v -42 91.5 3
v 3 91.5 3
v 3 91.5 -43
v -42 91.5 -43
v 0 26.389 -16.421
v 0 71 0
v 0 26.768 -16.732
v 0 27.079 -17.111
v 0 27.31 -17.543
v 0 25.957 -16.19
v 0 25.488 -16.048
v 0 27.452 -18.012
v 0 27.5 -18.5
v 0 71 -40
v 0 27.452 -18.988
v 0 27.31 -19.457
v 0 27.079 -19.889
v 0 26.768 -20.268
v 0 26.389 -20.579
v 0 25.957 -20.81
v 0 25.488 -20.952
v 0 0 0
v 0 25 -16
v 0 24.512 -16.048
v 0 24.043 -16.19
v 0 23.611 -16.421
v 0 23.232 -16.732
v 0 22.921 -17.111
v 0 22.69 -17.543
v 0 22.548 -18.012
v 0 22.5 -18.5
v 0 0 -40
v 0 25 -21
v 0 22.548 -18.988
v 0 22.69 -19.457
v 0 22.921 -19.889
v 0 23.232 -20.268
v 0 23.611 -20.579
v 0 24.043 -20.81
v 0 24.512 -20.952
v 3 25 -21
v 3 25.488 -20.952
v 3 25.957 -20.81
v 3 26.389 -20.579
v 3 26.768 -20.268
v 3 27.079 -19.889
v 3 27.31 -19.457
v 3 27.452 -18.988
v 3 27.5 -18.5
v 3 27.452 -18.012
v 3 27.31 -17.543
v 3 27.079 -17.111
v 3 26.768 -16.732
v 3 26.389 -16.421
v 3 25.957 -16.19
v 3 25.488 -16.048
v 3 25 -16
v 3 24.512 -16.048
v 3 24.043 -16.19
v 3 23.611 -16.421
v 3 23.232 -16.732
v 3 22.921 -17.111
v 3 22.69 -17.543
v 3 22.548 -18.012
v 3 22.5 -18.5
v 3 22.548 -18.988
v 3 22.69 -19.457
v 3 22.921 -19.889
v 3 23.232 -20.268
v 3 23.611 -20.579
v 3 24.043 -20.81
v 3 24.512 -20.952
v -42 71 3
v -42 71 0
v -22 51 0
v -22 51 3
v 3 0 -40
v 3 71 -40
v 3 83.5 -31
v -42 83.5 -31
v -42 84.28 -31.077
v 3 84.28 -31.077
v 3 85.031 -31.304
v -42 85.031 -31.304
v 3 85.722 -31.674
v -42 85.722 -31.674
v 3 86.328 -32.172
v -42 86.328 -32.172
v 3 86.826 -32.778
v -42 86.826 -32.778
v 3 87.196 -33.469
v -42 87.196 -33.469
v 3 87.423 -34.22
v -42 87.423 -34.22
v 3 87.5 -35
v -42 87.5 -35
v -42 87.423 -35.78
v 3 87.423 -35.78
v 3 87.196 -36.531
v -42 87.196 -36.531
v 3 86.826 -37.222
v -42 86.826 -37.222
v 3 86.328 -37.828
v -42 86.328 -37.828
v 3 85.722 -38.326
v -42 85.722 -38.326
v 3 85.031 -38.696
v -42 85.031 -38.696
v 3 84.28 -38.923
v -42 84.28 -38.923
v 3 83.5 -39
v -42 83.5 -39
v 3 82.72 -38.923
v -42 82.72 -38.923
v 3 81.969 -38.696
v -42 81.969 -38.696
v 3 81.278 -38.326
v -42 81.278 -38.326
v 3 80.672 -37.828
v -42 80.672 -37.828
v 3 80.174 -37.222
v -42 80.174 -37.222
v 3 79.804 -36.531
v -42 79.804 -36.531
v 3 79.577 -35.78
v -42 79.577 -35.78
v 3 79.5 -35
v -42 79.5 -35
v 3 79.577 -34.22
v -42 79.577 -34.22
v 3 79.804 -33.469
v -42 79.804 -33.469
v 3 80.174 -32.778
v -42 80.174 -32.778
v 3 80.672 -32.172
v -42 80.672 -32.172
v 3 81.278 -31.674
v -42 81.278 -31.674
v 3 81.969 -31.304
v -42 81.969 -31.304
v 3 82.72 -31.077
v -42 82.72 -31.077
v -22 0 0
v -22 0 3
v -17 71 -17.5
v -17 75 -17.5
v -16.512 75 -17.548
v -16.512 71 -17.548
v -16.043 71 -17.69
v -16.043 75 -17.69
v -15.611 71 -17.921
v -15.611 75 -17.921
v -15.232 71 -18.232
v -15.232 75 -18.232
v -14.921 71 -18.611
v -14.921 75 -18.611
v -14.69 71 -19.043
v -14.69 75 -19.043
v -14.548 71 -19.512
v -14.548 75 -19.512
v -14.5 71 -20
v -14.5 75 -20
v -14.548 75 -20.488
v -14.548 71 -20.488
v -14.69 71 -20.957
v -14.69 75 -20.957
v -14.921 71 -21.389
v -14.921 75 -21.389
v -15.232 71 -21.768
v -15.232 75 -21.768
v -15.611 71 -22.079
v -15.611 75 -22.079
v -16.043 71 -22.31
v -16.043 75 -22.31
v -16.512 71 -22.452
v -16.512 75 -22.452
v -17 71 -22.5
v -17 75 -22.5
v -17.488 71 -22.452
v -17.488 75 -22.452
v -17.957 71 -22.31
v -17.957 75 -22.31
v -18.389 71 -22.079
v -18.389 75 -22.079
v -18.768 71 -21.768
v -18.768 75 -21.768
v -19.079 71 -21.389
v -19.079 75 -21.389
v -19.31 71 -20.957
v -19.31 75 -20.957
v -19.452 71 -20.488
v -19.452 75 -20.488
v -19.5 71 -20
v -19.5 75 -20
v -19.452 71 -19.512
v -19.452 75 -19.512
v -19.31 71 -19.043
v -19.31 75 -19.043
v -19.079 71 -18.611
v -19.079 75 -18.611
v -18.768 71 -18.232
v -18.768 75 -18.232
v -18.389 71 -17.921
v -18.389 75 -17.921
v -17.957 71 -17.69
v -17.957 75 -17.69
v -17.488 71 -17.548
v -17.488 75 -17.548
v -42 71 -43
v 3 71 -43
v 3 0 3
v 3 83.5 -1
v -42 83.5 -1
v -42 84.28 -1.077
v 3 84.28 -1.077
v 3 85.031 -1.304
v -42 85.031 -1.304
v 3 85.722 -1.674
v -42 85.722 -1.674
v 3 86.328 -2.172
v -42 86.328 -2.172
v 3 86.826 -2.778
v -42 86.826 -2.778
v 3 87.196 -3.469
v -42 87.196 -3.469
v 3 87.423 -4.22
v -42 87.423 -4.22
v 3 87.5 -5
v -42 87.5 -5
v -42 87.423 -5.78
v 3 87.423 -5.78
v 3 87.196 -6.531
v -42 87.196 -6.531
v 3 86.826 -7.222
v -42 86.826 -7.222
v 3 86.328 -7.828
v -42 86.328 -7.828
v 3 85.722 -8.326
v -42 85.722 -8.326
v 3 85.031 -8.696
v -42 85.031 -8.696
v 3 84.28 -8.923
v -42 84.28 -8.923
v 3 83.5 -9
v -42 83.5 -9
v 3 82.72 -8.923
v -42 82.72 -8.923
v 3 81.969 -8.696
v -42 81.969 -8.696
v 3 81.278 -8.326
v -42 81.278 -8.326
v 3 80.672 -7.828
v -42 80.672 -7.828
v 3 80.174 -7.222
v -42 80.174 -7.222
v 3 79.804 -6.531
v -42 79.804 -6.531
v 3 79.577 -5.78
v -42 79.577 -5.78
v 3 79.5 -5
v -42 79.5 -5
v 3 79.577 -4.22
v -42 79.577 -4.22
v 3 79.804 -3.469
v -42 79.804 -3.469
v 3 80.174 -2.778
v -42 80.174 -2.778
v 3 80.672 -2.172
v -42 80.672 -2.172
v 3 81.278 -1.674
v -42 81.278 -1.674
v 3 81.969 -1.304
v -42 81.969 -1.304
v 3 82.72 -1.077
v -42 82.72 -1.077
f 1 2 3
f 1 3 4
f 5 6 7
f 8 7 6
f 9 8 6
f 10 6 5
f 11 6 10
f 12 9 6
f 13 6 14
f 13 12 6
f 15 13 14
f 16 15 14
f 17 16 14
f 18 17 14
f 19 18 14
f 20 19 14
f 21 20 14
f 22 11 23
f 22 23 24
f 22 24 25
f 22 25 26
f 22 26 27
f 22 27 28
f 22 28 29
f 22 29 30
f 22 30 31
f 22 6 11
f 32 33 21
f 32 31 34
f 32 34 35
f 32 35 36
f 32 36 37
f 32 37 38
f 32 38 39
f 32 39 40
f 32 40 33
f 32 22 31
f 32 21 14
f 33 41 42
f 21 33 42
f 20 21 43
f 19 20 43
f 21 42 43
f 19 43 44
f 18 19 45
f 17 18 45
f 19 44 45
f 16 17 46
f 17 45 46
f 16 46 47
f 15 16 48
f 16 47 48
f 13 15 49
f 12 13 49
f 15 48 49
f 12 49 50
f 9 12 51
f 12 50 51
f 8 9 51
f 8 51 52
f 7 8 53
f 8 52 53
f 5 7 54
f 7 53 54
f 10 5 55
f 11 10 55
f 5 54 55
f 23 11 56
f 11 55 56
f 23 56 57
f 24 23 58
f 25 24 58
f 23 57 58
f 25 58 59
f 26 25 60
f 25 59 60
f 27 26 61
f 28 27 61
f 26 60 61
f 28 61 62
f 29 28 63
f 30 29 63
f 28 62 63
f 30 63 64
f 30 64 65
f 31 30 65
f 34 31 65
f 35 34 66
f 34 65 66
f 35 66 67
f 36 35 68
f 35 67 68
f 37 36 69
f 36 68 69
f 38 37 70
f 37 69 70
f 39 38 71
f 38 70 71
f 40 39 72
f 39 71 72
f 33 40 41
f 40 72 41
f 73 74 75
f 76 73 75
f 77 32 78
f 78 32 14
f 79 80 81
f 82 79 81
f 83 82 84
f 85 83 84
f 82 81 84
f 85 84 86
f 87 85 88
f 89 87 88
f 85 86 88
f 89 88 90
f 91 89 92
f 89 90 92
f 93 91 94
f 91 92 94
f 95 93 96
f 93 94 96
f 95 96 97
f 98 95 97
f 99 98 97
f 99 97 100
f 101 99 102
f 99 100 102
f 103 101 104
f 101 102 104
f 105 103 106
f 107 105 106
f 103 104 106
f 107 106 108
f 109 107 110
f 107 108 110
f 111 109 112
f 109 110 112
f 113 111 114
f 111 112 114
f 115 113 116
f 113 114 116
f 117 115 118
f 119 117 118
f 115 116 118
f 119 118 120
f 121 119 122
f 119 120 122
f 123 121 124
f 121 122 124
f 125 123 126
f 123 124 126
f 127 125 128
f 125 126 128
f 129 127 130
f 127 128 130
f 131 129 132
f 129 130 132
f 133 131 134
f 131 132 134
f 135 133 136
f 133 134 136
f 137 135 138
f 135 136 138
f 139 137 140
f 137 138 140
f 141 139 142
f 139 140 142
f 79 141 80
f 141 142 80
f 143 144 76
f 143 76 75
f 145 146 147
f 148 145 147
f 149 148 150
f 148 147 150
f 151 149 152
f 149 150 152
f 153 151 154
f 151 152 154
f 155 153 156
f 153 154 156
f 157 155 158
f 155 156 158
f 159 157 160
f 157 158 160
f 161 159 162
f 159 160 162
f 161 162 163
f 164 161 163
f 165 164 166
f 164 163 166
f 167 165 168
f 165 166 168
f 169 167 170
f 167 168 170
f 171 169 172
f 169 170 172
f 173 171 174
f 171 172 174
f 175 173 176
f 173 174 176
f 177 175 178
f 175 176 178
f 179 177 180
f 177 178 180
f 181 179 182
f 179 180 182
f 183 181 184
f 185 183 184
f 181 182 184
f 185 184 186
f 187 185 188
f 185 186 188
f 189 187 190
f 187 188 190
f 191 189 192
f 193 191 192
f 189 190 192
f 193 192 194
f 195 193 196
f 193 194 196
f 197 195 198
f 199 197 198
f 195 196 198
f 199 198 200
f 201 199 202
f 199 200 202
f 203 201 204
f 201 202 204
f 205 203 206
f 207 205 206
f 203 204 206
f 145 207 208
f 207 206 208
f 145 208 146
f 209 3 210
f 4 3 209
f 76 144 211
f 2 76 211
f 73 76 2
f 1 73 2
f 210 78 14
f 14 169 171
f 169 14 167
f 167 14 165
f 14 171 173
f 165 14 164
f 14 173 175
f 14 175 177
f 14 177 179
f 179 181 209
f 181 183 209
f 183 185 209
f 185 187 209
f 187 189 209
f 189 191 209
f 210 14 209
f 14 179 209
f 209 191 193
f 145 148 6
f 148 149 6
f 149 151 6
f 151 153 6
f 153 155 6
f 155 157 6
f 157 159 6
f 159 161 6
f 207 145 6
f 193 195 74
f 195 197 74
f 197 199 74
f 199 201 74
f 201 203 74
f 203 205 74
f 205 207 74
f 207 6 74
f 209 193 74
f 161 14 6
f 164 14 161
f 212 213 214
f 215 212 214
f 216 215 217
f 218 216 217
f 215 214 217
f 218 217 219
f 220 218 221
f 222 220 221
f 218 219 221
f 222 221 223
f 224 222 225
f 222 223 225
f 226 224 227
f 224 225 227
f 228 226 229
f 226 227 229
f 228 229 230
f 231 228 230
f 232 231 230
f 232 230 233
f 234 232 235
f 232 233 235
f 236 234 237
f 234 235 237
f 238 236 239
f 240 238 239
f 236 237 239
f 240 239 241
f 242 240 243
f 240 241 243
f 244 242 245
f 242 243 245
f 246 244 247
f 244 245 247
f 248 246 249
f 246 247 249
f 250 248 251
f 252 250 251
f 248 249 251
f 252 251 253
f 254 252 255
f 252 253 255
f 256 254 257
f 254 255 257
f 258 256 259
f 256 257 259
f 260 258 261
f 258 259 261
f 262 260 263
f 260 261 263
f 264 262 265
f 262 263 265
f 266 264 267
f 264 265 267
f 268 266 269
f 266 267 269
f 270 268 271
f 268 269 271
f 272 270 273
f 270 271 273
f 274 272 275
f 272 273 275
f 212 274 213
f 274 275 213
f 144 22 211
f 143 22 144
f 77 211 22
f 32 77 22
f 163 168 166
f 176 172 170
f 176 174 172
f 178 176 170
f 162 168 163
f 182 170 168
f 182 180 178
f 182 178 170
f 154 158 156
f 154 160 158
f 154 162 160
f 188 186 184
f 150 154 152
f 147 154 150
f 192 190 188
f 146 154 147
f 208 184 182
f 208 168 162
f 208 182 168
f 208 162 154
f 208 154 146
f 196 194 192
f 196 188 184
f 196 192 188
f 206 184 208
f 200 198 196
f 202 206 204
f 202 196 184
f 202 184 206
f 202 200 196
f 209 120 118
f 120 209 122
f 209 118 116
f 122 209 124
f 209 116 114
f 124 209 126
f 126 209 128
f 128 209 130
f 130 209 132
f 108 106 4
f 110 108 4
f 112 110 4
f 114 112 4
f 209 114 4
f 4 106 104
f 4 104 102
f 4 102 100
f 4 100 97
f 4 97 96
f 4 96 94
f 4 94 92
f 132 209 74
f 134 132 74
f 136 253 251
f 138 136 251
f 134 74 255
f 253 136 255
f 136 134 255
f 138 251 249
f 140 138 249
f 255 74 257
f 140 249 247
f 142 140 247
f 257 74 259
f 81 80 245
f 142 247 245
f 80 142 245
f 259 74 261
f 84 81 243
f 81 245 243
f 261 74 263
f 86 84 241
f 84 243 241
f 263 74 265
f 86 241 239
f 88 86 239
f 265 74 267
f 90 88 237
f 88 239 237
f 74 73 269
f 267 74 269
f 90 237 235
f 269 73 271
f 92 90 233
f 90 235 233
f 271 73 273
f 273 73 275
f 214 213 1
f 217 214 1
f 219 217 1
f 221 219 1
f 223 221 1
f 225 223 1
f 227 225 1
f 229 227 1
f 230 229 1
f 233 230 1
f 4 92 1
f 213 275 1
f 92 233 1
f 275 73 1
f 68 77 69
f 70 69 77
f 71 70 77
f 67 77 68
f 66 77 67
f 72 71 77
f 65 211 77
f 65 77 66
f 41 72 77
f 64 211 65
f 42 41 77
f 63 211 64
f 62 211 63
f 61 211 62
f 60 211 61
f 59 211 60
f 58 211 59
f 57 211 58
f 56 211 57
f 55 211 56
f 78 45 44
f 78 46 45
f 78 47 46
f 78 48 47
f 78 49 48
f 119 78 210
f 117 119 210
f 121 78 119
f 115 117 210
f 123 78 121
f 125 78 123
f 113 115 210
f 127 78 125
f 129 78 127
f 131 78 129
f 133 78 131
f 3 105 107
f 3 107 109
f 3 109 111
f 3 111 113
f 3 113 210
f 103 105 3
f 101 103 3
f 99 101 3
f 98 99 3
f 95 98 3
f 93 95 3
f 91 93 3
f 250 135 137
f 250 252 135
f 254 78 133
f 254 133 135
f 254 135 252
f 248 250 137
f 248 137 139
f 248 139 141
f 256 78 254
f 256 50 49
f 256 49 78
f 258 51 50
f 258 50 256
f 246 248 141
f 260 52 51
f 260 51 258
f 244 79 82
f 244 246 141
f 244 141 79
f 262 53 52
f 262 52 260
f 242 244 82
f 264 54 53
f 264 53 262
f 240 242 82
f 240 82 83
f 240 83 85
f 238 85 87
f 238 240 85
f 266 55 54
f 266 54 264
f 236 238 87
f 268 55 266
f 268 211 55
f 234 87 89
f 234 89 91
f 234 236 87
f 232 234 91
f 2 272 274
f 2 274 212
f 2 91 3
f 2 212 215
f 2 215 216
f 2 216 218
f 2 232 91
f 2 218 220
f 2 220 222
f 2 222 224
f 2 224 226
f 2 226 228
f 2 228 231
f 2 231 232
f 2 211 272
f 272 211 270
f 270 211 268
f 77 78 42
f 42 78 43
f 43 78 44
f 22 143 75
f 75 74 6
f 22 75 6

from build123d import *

# Parameters (mm, degrees)
BOSS_EXTRUDE1_DEPTH = 75
SKETCH2_W           = 42
SKETCH2_H           = 40
SKETCH2_R           = 2.5
BOSS_EXTRUDE2_DEPTH = 4
BOSS_EXTRUDE3_DEPTH = 3
SKETCH4_R           = 2.5
CUT_EXTRUDE1_DEPTH  = 3
SKETCH5_W           = 43
SKETCH5_H           = 16.5
SKETCH5_R           = 4
BOSS_EXTRUDE4_DEPTH = 45
SKETCH6_W           = 45
SKETCH6_H           = 20.5
BOSS_EXTRUDE6_DEPTH = 3


with BuildPart() as part:
    # Sketch1 → Boss-Extrude1 (new body)
    with BuildSketch(Plane(origin=(0, 0, 0), x_dir=(1, 0, 0), z_dir=(0, 1, 0))):
        Polygon((0, 0), (0, 40), (3, 40), (3, -3), (-22, -3), (-22, 0), align=None)
    extrude(amount=BOSS_EXTRUDE1_DEPTH)

    # Sketch2 → Boss-Extrude2 (add)
    with BuildSketch(Plane(origin=(0, 75, 0), x_dir=(1, 0, 0), z_dir=(0, 1, 0))):
        with Locations((-21, 20)):
            Rectangle(SKETCH2_W, SKETCH2_H)
        with Locations(Location((-17, 20, 0), (0, 0, 270))):
            Circle(SKETCH2_R, mode=Mode.SUBTRACT)
    extrude(amount=-BOSS_EXTRUDE2_DEPTH)

    # Sketch3 → Boss-Extrude3 (add)
    with BuildSketch(Plane.XY):
        Polygon((-22, 75), (-42, 75), (-42, 71), (-22, 51), align=None)
    extrude(amount=BOSS_EXTRUDE3_DEPTH)

    # Sketch4 → Cut-Extrude1 (cut)
    with BuildSketch(Plane(origin=(3, 0, 0), x_dir=(0, 0, -1), z_dir=(1, 0, 0))):
        with Locations((18.5, 25)):
            Circle(SKETCH4_R)
    extrude(amount=-CUT_EXTRUDE1_DEPTH, mode=Mode.SUBTRACT)

    # Sketch5 → Boss-Extrude4 (add)
    with BuildSketch(Plane.ZY.offset(42)):
        with Locations((-18.5, 83.25)):
            Rectangle(SKETCH5_W, SKETCH5_H)
        with Locations((-35, 83.5)):
            Circle(SKETCH5_R, mode=Mode.SUBTRACT)
        with Locations((-5, 83.5)):
            Circle(SKETCH5_R, mode=Mode.SUBTRACT)
    extrude(amount=-BOSS_EXTRUDE4_DEPTH)

    # Sketch6 → Boss-Extrude6 (add)
    with BuildSketch(Plane(origin=(0, 0, -40), x_dir=(-1, 0, 0), z_dir=(0, 0, -1))):
        with Locations((19.5, 81.25)):
            Rectangle(SKETCH6_W, SKETCH6_H)
    extrude(amount=BOSS_EXTRUDE6_DEPTH)


solid = part.part
